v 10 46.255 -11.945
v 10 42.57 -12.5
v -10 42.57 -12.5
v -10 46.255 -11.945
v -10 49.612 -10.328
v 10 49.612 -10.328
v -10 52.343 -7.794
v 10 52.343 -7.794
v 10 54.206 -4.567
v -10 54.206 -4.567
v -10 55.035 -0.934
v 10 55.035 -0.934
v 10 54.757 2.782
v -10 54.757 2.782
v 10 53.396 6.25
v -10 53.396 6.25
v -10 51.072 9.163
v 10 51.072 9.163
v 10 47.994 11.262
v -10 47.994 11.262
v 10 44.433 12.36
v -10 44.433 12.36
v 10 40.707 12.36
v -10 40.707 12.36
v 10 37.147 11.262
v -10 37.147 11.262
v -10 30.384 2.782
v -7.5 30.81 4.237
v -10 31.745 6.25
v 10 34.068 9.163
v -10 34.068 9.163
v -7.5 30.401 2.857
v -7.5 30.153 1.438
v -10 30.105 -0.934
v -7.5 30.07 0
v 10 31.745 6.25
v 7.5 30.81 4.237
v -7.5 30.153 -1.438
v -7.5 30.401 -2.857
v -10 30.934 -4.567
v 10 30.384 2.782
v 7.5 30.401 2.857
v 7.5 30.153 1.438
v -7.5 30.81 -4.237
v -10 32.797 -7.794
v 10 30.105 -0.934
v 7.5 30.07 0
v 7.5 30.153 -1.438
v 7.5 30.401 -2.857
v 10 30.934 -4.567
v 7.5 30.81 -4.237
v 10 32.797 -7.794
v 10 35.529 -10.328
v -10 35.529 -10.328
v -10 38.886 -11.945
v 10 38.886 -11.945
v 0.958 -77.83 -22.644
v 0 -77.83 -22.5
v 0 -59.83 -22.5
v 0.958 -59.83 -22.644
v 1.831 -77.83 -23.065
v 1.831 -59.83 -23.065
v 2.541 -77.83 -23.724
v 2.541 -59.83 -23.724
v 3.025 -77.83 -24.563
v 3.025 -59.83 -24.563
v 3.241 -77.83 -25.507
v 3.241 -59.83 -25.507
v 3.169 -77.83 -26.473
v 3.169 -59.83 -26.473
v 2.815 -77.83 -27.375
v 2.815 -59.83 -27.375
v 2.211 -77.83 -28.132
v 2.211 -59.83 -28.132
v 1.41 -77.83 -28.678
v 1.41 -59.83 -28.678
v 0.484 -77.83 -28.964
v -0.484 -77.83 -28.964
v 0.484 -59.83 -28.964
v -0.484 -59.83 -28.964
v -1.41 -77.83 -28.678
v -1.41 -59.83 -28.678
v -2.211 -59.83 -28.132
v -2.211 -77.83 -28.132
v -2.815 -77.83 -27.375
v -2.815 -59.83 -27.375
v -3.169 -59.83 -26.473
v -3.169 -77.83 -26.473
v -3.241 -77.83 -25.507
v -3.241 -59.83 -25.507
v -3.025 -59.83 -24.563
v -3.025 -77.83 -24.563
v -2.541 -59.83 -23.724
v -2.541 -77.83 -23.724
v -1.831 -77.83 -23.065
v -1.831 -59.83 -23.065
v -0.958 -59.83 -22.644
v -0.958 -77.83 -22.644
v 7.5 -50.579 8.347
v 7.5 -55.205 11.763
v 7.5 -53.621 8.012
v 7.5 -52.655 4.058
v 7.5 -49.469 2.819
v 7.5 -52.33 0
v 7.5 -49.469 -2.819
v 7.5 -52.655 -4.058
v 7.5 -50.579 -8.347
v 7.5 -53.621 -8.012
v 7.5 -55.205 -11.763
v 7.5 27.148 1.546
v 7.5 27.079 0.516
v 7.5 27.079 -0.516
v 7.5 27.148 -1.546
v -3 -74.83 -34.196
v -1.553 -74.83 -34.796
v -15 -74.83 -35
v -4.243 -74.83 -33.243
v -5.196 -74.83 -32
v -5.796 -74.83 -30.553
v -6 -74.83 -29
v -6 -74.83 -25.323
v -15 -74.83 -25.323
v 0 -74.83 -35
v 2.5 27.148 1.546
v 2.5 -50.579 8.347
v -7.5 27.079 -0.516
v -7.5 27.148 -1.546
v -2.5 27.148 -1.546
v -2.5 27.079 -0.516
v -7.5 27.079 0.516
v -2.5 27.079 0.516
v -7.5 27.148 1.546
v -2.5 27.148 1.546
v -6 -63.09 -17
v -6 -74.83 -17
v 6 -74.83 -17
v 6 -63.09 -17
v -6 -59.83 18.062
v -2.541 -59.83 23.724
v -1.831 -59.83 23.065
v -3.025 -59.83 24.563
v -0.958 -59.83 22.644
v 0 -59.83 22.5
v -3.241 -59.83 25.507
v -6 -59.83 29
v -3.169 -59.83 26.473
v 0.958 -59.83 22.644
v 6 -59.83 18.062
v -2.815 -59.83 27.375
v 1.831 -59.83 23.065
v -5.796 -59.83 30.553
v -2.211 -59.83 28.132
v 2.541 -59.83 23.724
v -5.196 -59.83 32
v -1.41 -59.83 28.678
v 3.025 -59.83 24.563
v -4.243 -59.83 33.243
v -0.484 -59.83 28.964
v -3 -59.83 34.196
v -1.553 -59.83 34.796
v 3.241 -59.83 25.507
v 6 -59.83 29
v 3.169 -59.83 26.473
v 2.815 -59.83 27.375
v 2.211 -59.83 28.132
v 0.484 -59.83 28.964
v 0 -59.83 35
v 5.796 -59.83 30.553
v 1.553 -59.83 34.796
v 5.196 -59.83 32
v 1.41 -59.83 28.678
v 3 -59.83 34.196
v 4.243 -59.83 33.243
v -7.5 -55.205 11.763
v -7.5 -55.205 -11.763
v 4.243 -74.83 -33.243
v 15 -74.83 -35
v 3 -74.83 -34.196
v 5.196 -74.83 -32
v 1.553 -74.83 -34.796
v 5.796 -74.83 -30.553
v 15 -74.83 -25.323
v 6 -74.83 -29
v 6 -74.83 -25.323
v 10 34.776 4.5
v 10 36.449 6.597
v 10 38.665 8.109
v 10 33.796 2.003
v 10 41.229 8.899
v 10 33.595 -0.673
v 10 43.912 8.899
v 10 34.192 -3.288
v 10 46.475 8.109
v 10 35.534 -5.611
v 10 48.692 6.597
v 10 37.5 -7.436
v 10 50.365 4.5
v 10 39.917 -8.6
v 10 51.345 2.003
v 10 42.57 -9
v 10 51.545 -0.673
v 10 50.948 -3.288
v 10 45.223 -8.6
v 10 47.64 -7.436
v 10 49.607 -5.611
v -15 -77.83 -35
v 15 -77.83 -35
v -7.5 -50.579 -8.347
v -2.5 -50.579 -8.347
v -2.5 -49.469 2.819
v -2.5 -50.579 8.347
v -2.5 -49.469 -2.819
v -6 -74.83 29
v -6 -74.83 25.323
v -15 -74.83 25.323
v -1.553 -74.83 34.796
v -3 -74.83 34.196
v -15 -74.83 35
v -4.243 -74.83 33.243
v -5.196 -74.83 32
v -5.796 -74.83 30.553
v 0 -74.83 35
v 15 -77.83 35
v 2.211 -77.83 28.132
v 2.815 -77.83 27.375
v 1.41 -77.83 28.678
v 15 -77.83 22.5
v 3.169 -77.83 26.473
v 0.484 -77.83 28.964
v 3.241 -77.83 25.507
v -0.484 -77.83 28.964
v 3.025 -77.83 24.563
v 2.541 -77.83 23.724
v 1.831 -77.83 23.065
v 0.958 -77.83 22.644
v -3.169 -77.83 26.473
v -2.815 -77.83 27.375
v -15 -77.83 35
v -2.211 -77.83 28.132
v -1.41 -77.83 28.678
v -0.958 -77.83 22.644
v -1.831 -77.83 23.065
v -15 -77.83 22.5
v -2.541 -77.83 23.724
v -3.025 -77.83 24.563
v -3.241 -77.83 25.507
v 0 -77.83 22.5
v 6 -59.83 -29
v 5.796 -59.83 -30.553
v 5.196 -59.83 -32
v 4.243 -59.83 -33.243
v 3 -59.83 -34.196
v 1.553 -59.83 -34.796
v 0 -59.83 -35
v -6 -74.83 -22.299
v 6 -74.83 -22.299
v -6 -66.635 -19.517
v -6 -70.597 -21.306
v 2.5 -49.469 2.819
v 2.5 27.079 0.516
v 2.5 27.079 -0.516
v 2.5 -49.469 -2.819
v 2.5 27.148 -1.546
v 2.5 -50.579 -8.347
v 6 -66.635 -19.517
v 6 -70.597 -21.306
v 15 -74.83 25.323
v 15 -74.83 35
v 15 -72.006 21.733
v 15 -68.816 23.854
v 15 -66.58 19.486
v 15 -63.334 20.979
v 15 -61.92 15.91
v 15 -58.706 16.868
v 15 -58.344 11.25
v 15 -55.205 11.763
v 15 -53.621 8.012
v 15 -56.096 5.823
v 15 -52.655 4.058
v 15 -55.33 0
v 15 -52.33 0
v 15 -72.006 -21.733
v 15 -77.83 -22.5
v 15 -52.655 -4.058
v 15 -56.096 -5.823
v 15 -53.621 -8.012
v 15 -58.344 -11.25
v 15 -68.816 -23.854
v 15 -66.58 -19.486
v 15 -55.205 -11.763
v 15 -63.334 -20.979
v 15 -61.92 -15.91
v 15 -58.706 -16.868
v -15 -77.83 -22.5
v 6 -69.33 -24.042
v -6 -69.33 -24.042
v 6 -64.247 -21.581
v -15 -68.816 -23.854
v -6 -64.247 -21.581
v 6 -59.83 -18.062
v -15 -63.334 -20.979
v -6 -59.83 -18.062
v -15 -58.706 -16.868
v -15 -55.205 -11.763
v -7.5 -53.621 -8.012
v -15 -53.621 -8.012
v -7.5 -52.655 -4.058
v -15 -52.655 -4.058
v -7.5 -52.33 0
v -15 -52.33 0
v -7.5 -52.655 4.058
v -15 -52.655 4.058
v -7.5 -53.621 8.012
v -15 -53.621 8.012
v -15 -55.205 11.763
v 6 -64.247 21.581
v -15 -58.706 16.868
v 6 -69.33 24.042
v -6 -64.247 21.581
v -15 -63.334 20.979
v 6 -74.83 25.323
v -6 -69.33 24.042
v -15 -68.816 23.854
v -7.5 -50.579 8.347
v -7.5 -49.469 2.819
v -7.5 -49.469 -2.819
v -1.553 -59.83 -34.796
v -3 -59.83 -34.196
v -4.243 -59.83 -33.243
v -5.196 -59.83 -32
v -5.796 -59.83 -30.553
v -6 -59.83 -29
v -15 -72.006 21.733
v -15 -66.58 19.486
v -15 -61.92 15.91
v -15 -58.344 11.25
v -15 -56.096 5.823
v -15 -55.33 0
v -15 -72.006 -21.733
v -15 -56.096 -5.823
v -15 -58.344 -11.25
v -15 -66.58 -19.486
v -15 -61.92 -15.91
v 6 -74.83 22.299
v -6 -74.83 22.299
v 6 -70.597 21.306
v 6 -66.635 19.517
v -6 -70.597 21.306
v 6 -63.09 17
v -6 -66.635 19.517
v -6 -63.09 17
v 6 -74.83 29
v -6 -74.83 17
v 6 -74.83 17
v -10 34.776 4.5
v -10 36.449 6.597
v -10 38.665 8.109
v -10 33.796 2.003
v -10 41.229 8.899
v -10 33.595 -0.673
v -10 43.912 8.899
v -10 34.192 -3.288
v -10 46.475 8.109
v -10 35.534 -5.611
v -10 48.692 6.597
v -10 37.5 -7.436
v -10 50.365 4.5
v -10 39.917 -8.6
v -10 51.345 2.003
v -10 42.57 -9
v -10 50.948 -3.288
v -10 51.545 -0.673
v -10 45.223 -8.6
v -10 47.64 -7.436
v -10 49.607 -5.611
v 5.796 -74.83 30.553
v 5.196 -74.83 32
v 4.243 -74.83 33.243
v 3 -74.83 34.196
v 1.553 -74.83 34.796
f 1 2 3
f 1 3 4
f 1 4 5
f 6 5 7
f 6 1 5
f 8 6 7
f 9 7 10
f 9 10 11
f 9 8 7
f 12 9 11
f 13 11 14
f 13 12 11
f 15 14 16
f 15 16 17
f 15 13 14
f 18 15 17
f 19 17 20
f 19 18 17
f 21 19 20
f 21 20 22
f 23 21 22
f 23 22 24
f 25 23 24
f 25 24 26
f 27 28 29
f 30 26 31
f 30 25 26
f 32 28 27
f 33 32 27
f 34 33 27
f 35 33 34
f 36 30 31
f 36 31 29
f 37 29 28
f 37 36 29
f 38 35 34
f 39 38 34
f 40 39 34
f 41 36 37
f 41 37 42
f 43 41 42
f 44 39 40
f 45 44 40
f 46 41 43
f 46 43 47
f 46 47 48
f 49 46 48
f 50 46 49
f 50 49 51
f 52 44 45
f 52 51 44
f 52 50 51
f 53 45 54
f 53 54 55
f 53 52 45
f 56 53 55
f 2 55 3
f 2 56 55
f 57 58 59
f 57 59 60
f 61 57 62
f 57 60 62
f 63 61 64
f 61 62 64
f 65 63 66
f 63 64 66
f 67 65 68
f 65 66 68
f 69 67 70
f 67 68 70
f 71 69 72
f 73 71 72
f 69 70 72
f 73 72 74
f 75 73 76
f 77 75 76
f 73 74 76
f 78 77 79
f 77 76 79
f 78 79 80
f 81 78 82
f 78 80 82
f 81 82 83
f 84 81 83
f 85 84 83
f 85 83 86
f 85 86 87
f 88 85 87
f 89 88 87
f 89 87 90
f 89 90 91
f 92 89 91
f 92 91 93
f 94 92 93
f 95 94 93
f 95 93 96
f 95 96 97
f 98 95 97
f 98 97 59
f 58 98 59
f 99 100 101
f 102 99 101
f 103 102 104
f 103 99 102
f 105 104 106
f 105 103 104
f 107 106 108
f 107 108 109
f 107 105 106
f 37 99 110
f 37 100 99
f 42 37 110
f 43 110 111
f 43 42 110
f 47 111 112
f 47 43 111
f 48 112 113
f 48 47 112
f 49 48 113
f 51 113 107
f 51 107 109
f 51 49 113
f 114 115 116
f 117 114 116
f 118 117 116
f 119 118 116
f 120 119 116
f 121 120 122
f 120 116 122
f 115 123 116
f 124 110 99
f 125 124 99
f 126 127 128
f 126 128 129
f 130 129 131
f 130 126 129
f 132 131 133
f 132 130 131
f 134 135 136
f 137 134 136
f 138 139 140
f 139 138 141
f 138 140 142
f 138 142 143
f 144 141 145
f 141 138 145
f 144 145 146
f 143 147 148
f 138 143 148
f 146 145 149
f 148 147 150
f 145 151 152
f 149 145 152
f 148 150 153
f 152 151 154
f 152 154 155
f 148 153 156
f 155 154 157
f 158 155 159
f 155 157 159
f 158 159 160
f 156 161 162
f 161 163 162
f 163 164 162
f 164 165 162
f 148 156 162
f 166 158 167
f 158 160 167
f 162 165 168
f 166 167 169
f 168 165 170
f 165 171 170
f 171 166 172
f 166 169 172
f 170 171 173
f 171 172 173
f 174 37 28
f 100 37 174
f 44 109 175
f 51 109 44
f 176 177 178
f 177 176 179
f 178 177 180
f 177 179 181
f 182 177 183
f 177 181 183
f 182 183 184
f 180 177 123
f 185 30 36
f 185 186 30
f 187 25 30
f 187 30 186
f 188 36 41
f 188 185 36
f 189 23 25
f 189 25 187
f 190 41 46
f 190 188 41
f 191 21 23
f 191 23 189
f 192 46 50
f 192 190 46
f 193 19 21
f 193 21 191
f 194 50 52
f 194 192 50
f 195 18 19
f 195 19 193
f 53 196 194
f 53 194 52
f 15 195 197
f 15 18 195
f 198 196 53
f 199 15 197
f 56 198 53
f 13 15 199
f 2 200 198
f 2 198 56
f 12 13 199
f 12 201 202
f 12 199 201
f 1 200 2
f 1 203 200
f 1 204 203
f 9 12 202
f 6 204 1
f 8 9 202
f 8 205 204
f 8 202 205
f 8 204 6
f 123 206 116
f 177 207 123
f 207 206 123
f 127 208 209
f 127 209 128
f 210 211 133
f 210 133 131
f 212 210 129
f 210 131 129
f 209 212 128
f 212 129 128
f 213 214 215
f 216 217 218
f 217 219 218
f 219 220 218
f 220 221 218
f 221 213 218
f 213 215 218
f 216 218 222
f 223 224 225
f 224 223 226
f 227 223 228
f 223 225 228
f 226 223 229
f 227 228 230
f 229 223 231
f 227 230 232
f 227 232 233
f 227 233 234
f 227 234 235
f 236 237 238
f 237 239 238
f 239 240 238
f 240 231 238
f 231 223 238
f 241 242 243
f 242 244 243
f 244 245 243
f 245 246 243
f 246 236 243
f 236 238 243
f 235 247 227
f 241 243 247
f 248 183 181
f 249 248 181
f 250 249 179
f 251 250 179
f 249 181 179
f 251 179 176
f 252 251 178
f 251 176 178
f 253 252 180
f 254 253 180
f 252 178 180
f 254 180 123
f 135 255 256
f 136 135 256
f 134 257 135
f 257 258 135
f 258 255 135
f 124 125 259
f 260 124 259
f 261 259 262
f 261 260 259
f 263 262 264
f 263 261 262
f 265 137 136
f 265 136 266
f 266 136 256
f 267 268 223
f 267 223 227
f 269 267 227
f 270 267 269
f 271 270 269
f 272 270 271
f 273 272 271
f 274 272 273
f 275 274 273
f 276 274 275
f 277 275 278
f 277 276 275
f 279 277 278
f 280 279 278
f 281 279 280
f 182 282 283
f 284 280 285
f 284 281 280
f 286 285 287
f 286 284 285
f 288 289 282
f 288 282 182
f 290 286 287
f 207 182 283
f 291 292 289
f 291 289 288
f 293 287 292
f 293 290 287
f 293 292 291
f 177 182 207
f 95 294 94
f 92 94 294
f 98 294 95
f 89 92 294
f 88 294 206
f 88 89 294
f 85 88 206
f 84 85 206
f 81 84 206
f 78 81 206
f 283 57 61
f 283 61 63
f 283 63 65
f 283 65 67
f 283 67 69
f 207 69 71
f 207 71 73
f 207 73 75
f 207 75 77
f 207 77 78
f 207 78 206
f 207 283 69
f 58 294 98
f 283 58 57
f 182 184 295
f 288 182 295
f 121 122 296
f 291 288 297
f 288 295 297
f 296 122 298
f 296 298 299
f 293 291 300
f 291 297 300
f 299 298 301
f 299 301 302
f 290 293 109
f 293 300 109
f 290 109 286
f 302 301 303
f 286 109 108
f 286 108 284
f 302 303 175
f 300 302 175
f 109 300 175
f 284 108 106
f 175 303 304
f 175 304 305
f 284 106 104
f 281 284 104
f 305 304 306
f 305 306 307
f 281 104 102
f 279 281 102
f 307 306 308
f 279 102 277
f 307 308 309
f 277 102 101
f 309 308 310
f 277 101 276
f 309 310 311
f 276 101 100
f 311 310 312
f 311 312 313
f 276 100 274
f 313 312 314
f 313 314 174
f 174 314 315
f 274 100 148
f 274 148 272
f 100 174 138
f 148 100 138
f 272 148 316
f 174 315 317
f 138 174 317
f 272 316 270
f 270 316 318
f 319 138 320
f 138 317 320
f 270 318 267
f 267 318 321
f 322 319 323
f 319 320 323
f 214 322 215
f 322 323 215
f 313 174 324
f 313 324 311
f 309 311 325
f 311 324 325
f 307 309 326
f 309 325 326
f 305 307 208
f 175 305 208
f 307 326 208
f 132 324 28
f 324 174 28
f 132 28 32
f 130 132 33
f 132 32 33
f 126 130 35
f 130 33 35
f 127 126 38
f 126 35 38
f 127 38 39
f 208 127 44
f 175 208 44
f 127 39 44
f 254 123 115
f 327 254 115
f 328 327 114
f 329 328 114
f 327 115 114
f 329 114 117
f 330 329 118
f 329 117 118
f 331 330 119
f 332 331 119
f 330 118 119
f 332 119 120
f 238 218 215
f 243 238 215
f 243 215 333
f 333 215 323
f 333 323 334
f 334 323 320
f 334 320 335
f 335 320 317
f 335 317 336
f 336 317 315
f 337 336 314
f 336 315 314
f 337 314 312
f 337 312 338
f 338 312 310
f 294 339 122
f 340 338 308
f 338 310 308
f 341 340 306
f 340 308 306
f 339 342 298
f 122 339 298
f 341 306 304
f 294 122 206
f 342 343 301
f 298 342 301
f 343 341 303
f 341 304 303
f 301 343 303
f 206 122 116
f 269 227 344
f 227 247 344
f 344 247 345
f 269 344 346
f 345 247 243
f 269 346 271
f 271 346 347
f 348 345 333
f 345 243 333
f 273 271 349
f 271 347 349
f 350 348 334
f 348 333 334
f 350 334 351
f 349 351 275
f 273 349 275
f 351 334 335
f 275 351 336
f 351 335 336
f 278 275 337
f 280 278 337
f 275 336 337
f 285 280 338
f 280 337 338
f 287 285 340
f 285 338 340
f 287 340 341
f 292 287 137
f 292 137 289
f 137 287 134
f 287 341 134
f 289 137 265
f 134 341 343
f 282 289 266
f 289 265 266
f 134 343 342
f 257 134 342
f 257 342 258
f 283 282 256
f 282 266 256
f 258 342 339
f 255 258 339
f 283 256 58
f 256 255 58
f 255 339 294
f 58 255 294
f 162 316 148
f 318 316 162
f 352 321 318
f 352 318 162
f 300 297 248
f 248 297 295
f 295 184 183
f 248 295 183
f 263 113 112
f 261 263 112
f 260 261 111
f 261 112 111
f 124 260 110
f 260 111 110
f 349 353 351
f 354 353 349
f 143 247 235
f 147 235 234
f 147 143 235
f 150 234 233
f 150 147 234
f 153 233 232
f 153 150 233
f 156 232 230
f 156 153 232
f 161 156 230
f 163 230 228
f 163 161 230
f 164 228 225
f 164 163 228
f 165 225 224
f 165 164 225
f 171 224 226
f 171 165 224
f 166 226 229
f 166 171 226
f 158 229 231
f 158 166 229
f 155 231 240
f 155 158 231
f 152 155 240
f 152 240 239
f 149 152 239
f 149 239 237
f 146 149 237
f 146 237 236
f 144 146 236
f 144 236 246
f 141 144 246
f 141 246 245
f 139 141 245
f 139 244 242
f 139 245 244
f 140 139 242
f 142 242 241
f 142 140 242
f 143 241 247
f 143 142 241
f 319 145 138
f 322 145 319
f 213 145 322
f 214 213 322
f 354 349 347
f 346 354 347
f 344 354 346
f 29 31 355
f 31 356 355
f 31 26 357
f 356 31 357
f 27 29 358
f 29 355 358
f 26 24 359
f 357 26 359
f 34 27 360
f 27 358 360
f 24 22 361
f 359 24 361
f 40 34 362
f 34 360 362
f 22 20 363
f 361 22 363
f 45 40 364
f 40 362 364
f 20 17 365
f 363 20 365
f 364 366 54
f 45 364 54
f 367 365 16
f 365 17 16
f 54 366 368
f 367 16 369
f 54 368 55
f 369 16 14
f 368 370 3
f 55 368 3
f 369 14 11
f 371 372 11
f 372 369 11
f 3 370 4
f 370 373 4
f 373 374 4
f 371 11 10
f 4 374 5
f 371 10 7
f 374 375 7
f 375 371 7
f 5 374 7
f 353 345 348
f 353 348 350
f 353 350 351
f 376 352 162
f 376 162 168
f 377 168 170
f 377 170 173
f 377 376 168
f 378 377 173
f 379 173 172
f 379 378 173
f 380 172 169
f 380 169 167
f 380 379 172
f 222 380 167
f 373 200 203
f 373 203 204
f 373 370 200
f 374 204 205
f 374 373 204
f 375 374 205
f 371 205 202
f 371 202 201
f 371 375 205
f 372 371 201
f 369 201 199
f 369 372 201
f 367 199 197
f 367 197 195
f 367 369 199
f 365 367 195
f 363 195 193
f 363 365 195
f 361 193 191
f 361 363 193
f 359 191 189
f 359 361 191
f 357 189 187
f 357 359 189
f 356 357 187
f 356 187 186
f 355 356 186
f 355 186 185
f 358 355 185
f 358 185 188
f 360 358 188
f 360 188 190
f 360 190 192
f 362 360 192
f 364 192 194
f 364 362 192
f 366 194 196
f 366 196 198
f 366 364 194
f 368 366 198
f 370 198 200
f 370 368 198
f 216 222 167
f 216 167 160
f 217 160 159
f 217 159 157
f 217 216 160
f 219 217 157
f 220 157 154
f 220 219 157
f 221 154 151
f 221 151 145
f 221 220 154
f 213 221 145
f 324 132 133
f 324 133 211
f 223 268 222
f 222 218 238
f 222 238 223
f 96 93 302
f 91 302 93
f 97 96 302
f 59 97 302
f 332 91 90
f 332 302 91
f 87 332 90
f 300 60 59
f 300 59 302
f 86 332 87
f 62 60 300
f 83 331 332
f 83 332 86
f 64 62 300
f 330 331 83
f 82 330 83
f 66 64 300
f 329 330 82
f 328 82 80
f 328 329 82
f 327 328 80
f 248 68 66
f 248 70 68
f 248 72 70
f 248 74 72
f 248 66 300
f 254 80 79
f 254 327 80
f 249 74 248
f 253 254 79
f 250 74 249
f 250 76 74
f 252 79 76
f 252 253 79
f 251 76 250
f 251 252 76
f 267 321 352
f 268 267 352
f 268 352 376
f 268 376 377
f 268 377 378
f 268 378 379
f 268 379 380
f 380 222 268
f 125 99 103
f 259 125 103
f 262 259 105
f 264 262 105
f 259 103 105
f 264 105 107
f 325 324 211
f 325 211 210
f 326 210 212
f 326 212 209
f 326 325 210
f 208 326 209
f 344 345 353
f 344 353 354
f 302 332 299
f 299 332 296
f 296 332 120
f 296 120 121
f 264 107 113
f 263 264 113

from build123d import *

# Parameters (mm, degrees)
SKETCH3_R           = 9
BOSS_EXTRUDE2_DEPTH = 10
BOSS_EXTRUDE3_DEPTH = 15
BOSS_EXTRUDE4_DEPTH = 7.5
BOSS_EXTRUDE5_DEPTH = 15
SKETCH5_R           = 3.25
CUT_EXTRUDE1_DEPTH  = 122.045487318
CUT_EXTRUDE3_DEPTH  = 5


with BuildPart() as part:
    # Sketch3 → Boss-Extrude2 (new, symmetric)
    with BuildSketch(Plane(origin=(0, 0, 0), x_dir=(0, 0, -1), z_dir=(1, 0, 0))):
        with BuildLine():
            ThreePointArc((-4.237325504, 30.810381037), (0, 30.070273578), (4.237325504, 30.810381037))
            ThreePointArc((4.237325504, 30.810381037), (10.227819142, 35.38405652), (12.5, 42.570273578))
            ThreePointArc((12.5, 42.570273578), (-7.186217058, 52.79809272), (-4.237325504, 30.810381037))
        make_face()
        with Locations((0, 42.570273578)):
            Circle(SKETCH3_R, mode=Mode.SUBTRACT)
    extrude(amount=BOSS_EXTRUDE2_DEPTH, both=True)



with BuildPart() as body_2:
    # Sketch3<4> → Boss-Extrude3 (new, symmetric)
    with BuildSketch(Plane(origin=(0, 0, 0), x_dir=(0, 0, -1), z_dir=(1, 0, 0))):
        with BuildLine():
            Line((-25.322914524, -74.829726422), (-35, -74.829726422))
            Line((-35, -74.829726422), (-35, -77.829726422))
            Line((-35, -77.829726422), (-22.5, -77.829726422))
            ThreePointArc((-22.5, -77.829726422), (0, -55.329726422), (22.5, -77.829726422))
            Line((22.5, -77.829726422), (35, -77.829726422))
            Line((35, -77.829726422), (35, -74.829726422))
            Line((35, -74.829726422), (25.322914524, -74.829726422))
            ThreePointArc((25.322914524, -74.829726422), (0, -52.329726422), (-25.322914524, -74.829726422))
        make_face()
    extrude(amount=BOSS_EXTRUDE3_DEPTH, both=True)


with BuildPart() as part_1:
    add(part.part)

    add(body_2.part)  # Boss-Extrude4 merges body 2
    # Sketch3<5> → Boss-Extrude4 (add, symmetric)
    with BuildSketch(Plane(origin=(0, 0, 0), x_dir=(0, 0, -1), z_dir=(1, 0, 0))):
        with BuildLine():
            ThreePointArc((4.237325504, 30.810381037), (0, 30.070273578), (-4.237325504, 30.810381037))
            Line((-4.237325504, 30.810381037), (-11.762674496, -55.204751534))
            ThreePointArc((-11.762674496, -55.204751534), (0, -52.329726422), (11.762674496, -55.204751534))
            Line((11.762674496, -55.204751534), (4.237325504, 30.810381037))
        make_face()
    extrude(amount=BOSS_EXTRUDE4_DEPTH, both=True)

    # Sketch4 → Boss-Extrude5 (add)
    with BuildSketch(Plane(origin=(0, -74.829726422, 0), x_dir=(1, 0, 0), z_dir=(0, 1, 0))):
        with BuildLine():
            ThreePointArc((6, 29), (0, 35), (-6, 29))
            Line((-6, 29), (-6, 17))
            Line((-6, 17), (6, 17))
            Line((6, 17), (6, 29))
        make_face()
    boss_extrude5 = extrude(amount=BOSS_EXTRUDE5_DEPTH)

    # Sketch5 → Cut-Extrude1 (cut, through all)
    with BuildSketch(Plane(origin=(0, -59.829726422, 0), x_dir=(1, 0, 0), z_dir=(0, 1, 0))):
        with Locations((0, 25.75)):
            Circle(SKETCH5_R)
    cut_extrude1 = extrude(amount=-CUT_EXTRUDE1_DEPTH, mode=Mode.SUBTRACT)

    # Mirror1: Boss-Extrude5, Cut-Extrude1 across plane
    add(boss_extrude5.mirror(Plane.XY))
    add(cut_extrude1.mirror(Plane.XY), mode=Mode.SUBTRACT)

    # Sketch9 → Cut-Extrude3 (cut)
    with BuildSketch(Plane.ZY.offset(7.5)):
        with BuildLine():
            ThreePointArc((1.546317924, 27.147598684), (0, 27.070273578), (-1.546317924, 27.147598684))
            Line((-1.546317924, 27.147598684), (-8.346541197, -50.579308993))
            ThreePointArc((-8.346541197, -50.579308993), (0, -49.329726422), (8.346541197, -50.579308993))
            Line((8.346541197, -50.579308993), (1.546317924, 27.147598684))
        make_face()
    cut_extrude3 = extrude(amount=-CUT_EXTRUDE3_DEPTH, mode=Mode.SUBTRACT)

    # Mirror2: Cut-Extrude3 across plane
    add(cut_extrude3.mirror(Plane(origin=(0, 0, 0), x_dir=(0, 0, 1), z_dir=(1, 0, 0))), mode=Mode.SUBTRACT)


solid = part_1.part
